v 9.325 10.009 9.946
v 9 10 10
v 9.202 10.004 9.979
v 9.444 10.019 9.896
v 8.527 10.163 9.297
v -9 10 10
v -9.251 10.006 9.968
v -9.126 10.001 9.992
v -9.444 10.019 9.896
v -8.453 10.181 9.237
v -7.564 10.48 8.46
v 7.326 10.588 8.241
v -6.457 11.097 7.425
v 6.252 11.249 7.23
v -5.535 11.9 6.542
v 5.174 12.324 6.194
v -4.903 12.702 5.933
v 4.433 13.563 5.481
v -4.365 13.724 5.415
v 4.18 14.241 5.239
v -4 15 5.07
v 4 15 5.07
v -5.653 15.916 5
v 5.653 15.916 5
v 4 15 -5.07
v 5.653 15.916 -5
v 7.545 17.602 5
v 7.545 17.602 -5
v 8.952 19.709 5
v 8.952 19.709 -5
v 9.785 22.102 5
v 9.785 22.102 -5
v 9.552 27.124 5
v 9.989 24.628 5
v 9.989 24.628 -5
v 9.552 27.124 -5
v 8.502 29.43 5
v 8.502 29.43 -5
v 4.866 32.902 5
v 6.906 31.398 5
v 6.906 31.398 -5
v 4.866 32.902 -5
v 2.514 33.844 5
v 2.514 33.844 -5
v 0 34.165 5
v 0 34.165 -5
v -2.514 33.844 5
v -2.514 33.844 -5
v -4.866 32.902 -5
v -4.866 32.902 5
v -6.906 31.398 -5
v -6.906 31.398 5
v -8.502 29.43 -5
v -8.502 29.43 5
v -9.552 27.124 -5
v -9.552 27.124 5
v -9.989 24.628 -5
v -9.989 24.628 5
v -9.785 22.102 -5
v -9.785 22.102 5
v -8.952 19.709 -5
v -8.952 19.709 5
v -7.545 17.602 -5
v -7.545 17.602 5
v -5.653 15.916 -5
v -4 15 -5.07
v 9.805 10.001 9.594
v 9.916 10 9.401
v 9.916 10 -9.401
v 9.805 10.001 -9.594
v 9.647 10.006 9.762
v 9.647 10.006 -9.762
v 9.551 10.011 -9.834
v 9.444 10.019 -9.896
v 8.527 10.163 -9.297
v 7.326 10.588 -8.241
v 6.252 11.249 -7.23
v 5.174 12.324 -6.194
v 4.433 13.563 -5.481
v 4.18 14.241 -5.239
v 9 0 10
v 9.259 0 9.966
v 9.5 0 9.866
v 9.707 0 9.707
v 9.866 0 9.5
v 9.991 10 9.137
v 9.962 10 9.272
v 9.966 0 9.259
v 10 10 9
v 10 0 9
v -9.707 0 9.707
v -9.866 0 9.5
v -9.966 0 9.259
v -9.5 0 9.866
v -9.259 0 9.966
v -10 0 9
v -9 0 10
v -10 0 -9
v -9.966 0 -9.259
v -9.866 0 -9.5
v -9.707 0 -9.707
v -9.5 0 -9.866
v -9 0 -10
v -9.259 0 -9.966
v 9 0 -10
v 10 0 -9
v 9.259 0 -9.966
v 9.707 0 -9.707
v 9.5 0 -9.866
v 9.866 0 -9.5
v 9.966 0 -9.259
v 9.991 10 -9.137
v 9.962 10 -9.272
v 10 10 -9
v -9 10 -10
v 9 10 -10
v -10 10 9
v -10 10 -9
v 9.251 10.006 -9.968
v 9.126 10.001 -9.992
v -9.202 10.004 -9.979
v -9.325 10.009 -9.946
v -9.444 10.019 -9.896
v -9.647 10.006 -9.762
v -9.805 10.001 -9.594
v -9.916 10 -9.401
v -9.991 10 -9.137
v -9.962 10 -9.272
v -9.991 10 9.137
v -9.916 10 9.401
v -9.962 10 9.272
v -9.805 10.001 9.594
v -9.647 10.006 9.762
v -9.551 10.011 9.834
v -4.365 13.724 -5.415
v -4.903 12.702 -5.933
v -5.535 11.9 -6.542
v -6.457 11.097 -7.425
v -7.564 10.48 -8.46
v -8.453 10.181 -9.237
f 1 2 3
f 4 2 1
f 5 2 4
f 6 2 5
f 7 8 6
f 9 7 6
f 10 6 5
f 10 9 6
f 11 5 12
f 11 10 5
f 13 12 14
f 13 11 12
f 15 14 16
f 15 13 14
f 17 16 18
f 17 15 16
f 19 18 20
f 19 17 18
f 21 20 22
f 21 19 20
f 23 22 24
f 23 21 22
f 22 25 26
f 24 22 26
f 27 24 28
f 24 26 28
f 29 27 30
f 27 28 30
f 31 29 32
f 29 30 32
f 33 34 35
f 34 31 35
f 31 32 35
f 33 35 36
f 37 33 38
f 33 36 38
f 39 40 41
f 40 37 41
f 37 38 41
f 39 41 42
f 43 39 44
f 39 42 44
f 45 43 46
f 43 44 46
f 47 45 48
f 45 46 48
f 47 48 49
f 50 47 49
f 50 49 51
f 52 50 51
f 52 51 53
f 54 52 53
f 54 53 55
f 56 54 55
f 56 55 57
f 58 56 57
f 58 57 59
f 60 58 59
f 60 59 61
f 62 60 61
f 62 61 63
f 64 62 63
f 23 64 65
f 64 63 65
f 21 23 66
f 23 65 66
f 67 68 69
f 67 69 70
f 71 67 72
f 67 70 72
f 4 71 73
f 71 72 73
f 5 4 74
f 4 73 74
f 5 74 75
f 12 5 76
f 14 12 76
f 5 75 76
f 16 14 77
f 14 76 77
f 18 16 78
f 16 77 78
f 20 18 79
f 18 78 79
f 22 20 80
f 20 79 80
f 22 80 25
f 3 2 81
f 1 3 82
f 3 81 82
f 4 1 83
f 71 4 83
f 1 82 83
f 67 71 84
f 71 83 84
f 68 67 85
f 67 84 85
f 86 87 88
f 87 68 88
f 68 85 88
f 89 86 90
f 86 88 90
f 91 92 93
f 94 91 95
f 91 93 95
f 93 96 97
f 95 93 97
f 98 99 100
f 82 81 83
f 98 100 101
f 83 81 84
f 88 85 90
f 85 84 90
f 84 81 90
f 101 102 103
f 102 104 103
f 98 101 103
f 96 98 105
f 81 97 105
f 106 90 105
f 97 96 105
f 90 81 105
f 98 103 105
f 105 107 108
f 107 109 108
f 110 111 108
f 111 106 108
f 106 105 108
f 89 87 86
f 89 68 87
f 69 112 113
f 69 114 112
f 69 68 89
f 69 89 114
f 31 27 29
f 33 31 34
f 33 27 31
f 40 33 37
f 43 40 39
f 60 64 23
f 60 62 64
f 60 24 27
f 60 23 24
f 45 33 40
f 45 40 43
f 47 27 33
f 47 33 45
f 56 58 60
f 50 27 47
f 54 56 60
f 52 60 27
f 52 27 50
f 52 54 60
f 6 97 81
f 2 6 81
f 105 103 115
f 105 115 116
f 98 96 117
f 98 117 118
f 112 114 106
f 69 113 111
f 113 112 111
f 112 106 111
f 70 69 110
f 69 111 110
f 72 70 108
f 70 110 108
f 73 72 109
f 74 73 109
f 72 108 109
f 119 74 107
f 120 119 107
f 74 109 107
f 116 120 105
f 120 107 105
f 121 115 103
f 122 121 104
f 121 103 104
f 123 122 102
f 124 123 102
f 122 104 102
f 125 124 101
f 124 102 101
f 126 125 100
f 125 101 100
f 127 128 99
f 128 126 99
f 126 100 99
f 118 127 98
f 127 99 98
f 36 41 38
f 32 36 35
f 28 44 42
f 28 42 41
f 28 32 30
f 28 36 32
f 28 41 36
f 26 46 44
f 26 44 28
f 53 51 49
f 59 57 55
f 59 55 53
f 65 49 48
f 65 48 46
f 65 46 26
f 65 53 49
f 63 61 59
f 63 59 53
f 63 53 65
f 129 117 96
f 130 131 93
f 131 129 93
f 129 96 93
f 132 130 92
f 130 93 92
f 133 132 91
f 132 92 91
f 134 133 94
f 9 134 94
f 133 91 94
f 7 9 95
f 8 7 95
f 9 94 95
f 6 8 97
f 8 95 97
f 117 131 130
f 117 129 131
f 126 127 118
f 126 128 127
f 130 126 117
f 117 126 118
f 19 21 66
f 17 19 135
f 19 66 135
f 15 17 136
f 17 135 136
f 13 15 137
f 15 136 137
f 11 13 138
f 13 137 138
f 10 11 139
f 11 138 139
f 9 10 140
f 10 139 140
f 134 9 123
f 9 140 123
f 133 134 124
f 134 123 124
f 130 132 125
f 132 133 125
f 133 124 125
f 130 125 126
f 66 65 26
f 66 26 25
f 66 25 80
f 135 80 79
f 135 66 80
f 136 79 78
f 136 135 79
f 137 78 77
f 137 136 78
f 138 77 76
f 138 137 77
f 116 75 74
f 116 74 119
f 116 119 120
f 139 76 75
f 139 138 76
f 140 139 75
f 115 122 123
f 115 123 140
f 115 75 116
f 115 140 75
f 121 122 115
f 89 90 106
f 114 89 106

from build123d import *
from OCP.BRepAlgoAPI import BRepAlgoAPI_Cut
from OCP.TopTools import TopTools_ListOfShape

# Parameters (mm, degrees)
SKIZZE1_W                       = 20
SKIZZE1_H                       = 20
AUFSATZ_LINEAR_AUSTRAGEN1_DEPTH = 10
AUFSATZ_LINEAR_AUSTRAGEN2_DEPTH = 5
VERRUNDUNG1_START               = -5
VERRUNDUNG1_DEPTH               = 10
VERRUNDUNG1_START_2             = -10.000001186
VERRUNDUNG1_2_DEPTH             = 20.000001186
VERRUNDUNG1_START_3             = -11
VERRUNDUNG1_3_DEPTH             = 22
VERRUNDUNG2_R                   = 1


with BuildPart() as part:
    # Skizze1 → Aufsatz-Linear austragen1 (new body)
    with BuildSketch(Plane(origin=(0, 0, 0), x_dir=(1, 0, 0), z_dir=(0, 1, 0))):
        Rectangle(SKIZZE1_W, SKIZZE1_H)
    extrude(amount=AUFSATZ_LINEAR_AUSTRAGEN1_DEPTH)

    # Skizze3 → Aufsatz-Linear austragen2 (add, symmetric)
    with BuildSketch(Plane.XY):
        with BuildLine():
            Line((-4, 15), (-4, 10))
            Line((-4, 10), (4, 10))
            Line((4, 10), (4, 15))
            ThreePointArc((4, 15), (0, 34.16515139), (-4, 15))
        make_face()
    extrude(amount=AUFSATZ_LINEAR_AUSTRAGEN2_DEPTH, both=True)


with BuildPart() as verrundung1_tool:
    # Verrundung1: read off the stored shape, not the designer's step
    # Verrundung1 outline → Verrundung1 (new body)
    with BuildSketch(Plane.XY.offset(VERRUNDUNG1_START)):
        with BuildLine():
            Line((4, 10), (9.916079783, 10))
            ThreePointArc((9.916079783, 10), (6.043096437, 11.417424305), (4, 15))
            Line((4, 15), (4, 10))
        make_face()
        with BuildLine():
            Line((-9.916079783, 10), (-4, 10))
            Line((-4, 10), (-4, 15))
            ThreePointArc((-4, 15), (-6.043096437, 11.417424305), (-9.916079783, 10))
        make_face()
    extrude(amount=VERRUNDUNG1_DEPTH)


with BuildPart() as part_1:
    add(part.part)


with BuildPart() as part_2:
    # Verrundung1: joined with verrundung1_tool
    add(part_1.part.fuse(verrundung1_tool.part, tol=0.00001))


with BuildPart() as verrundung1_2_tool:
    # Verrundung1 2 outline → Verrundung1 2 (new body)
    with BuildSketch(Plane.XY.offset(VERRUNDUNG1_START_2)):
        with BuildLine():
            Line((-9.916079783, 10), (9.916079783, 10))
            ThreePointArc((9.916079783, 10), (6.043096437, 11.417424305), (4, 15))
            ThreePointArc((4, 15), (0, 34.16515139), (-4, 15))
            ThreePointArc((-4, 15), (-6.043096437, 11.417424305), (-9.916079783, 10))
        make_face()
    extrude(amount=VERRUNDUNG1_2_DEPTH)


with BuildPart() as part_3:
    add(part_2.part)


with BuildPart() as part_4:
    # Verrundung1 2: joined with verrundung1_2_tool
    add(part_3.part.fuse(verrundung1_2_tool.part, tol=0.00001))


with BuildPart() as verrundung1_3_tool:
    # Verrundung1 3 outline → Verrundung1 3 (new body)
    with BuildSketch(Plane.YZ.offset(VERRUNDUNG1_START_3)):
        with BuildLine():
            Line((15.916079783, 5), (34.16515139, 5))
            Line((34.16515139, 5), (36, 5))
            Line((36, 5), (36, 10))
            Line((36, 10), (34.16515139, 10))
            Line((34.16515139, 10), (9.999989402, 10.000062699))
            ThreePointArc((9.999989402, 10.000062699), (12.043072154, 6.417444828), (15.916079783, 5))
        make_face()
        with BuildLine():
            Line((36, -10.000001186), (36, -5))
            Line((36, -5), (34.16515139, -5))
            Line((34.16515139, -5), (15.916079783, -5))
            ThreePointArc((15.916079783, -5), (12.043072154, -6.417444828), (9.999989402, -10.000062699))
            Line((9.999989402, -10.000062699), (34.16515139, -10.000001186))
            Line((34.16515139, -10.000001186), (36, -10.000001186))
        make_face()
    extrude(amount=VERRUNDUNG1_3_DEPTH)


with BuildPart() as part_5:
    add(part_4.part)

    # Verrundung1 3: cut by verrundung1_3_tool, with a tolerance
    verrundung1_3_stock = TopTools_ListOfShape()
    verrundung1_3_stock.Append(part_5.part.wrapped)
    verrundung1_3_tools = TopTools_ListOfShape()
    verrundung1_3_tools.Append(verrundung1_3_tool.part.wrapped)
    verrundung1_3_cut = BRepAlgoAPI_Cut()
    verrundung1_3_cut.SetArguments(verrundung1_3_stock)
    verrundung1_3_cut.SetTools(verrundung1_3_tools)
    verrundung1_3_cut.SetFuzzyValue(0.00001)
    verrundung1_3_cut.Build()
    add(Compound.cast(verrundung1_3_cut.Shape()).solids(), mode=Mode.REPLACE)

    # Verrundung2
    # the kernel refuses this fillet: 1 mm, written as the material it takes off along each edge
    with BuildSketch(Plane(origin=(-10, -2.5, 10), x_dir=(1, 0, 0), z_dir=(0, 1, 0)), Plane(origin=(-10, -2.5, -10), x_dir=(0, 0, 1), z_dir=(0, 1, 0))) as verrundung2_piece_1:
        with BuildLine():
            CenterArc((VERRUNDUNG2_R, VERRUNDUNG2_R), VERRUNDUNG2_R, 180, 90)
            Line((0, VERRUNDUNG2_R), (0, 0))
            Line((0, 0), (VERRUNDUNG2_R, 0))
        make_face()
    extrude(amount=15, mode=Mode.SUBTRACT)
    with BuildSketch(Plane(origin=(10, -2.5, -10), x_dir=(0, 0, 1), z_dir=(0, 1, 0)), Plane(origin=(10, -2.5, 10), x_dir=(-1, 0, 0), z_dir=(0, 1, 0))) as verrundung2_piece_2:
        with BuildLine():
            CenterArc((VERRUNDUNG2_R, -VERRUNDUNG2_R), VERRUNDUNG2_R, 90, 90)
            Line((0, -VERRUNDUNG2_R), (0, 0))
            Line((0, 0), (VERRUNDUNG2_R, 0))
        make_face()
    extrude(amount=15, mode=Mode.SUBTRACT)


solid = part_5.part
